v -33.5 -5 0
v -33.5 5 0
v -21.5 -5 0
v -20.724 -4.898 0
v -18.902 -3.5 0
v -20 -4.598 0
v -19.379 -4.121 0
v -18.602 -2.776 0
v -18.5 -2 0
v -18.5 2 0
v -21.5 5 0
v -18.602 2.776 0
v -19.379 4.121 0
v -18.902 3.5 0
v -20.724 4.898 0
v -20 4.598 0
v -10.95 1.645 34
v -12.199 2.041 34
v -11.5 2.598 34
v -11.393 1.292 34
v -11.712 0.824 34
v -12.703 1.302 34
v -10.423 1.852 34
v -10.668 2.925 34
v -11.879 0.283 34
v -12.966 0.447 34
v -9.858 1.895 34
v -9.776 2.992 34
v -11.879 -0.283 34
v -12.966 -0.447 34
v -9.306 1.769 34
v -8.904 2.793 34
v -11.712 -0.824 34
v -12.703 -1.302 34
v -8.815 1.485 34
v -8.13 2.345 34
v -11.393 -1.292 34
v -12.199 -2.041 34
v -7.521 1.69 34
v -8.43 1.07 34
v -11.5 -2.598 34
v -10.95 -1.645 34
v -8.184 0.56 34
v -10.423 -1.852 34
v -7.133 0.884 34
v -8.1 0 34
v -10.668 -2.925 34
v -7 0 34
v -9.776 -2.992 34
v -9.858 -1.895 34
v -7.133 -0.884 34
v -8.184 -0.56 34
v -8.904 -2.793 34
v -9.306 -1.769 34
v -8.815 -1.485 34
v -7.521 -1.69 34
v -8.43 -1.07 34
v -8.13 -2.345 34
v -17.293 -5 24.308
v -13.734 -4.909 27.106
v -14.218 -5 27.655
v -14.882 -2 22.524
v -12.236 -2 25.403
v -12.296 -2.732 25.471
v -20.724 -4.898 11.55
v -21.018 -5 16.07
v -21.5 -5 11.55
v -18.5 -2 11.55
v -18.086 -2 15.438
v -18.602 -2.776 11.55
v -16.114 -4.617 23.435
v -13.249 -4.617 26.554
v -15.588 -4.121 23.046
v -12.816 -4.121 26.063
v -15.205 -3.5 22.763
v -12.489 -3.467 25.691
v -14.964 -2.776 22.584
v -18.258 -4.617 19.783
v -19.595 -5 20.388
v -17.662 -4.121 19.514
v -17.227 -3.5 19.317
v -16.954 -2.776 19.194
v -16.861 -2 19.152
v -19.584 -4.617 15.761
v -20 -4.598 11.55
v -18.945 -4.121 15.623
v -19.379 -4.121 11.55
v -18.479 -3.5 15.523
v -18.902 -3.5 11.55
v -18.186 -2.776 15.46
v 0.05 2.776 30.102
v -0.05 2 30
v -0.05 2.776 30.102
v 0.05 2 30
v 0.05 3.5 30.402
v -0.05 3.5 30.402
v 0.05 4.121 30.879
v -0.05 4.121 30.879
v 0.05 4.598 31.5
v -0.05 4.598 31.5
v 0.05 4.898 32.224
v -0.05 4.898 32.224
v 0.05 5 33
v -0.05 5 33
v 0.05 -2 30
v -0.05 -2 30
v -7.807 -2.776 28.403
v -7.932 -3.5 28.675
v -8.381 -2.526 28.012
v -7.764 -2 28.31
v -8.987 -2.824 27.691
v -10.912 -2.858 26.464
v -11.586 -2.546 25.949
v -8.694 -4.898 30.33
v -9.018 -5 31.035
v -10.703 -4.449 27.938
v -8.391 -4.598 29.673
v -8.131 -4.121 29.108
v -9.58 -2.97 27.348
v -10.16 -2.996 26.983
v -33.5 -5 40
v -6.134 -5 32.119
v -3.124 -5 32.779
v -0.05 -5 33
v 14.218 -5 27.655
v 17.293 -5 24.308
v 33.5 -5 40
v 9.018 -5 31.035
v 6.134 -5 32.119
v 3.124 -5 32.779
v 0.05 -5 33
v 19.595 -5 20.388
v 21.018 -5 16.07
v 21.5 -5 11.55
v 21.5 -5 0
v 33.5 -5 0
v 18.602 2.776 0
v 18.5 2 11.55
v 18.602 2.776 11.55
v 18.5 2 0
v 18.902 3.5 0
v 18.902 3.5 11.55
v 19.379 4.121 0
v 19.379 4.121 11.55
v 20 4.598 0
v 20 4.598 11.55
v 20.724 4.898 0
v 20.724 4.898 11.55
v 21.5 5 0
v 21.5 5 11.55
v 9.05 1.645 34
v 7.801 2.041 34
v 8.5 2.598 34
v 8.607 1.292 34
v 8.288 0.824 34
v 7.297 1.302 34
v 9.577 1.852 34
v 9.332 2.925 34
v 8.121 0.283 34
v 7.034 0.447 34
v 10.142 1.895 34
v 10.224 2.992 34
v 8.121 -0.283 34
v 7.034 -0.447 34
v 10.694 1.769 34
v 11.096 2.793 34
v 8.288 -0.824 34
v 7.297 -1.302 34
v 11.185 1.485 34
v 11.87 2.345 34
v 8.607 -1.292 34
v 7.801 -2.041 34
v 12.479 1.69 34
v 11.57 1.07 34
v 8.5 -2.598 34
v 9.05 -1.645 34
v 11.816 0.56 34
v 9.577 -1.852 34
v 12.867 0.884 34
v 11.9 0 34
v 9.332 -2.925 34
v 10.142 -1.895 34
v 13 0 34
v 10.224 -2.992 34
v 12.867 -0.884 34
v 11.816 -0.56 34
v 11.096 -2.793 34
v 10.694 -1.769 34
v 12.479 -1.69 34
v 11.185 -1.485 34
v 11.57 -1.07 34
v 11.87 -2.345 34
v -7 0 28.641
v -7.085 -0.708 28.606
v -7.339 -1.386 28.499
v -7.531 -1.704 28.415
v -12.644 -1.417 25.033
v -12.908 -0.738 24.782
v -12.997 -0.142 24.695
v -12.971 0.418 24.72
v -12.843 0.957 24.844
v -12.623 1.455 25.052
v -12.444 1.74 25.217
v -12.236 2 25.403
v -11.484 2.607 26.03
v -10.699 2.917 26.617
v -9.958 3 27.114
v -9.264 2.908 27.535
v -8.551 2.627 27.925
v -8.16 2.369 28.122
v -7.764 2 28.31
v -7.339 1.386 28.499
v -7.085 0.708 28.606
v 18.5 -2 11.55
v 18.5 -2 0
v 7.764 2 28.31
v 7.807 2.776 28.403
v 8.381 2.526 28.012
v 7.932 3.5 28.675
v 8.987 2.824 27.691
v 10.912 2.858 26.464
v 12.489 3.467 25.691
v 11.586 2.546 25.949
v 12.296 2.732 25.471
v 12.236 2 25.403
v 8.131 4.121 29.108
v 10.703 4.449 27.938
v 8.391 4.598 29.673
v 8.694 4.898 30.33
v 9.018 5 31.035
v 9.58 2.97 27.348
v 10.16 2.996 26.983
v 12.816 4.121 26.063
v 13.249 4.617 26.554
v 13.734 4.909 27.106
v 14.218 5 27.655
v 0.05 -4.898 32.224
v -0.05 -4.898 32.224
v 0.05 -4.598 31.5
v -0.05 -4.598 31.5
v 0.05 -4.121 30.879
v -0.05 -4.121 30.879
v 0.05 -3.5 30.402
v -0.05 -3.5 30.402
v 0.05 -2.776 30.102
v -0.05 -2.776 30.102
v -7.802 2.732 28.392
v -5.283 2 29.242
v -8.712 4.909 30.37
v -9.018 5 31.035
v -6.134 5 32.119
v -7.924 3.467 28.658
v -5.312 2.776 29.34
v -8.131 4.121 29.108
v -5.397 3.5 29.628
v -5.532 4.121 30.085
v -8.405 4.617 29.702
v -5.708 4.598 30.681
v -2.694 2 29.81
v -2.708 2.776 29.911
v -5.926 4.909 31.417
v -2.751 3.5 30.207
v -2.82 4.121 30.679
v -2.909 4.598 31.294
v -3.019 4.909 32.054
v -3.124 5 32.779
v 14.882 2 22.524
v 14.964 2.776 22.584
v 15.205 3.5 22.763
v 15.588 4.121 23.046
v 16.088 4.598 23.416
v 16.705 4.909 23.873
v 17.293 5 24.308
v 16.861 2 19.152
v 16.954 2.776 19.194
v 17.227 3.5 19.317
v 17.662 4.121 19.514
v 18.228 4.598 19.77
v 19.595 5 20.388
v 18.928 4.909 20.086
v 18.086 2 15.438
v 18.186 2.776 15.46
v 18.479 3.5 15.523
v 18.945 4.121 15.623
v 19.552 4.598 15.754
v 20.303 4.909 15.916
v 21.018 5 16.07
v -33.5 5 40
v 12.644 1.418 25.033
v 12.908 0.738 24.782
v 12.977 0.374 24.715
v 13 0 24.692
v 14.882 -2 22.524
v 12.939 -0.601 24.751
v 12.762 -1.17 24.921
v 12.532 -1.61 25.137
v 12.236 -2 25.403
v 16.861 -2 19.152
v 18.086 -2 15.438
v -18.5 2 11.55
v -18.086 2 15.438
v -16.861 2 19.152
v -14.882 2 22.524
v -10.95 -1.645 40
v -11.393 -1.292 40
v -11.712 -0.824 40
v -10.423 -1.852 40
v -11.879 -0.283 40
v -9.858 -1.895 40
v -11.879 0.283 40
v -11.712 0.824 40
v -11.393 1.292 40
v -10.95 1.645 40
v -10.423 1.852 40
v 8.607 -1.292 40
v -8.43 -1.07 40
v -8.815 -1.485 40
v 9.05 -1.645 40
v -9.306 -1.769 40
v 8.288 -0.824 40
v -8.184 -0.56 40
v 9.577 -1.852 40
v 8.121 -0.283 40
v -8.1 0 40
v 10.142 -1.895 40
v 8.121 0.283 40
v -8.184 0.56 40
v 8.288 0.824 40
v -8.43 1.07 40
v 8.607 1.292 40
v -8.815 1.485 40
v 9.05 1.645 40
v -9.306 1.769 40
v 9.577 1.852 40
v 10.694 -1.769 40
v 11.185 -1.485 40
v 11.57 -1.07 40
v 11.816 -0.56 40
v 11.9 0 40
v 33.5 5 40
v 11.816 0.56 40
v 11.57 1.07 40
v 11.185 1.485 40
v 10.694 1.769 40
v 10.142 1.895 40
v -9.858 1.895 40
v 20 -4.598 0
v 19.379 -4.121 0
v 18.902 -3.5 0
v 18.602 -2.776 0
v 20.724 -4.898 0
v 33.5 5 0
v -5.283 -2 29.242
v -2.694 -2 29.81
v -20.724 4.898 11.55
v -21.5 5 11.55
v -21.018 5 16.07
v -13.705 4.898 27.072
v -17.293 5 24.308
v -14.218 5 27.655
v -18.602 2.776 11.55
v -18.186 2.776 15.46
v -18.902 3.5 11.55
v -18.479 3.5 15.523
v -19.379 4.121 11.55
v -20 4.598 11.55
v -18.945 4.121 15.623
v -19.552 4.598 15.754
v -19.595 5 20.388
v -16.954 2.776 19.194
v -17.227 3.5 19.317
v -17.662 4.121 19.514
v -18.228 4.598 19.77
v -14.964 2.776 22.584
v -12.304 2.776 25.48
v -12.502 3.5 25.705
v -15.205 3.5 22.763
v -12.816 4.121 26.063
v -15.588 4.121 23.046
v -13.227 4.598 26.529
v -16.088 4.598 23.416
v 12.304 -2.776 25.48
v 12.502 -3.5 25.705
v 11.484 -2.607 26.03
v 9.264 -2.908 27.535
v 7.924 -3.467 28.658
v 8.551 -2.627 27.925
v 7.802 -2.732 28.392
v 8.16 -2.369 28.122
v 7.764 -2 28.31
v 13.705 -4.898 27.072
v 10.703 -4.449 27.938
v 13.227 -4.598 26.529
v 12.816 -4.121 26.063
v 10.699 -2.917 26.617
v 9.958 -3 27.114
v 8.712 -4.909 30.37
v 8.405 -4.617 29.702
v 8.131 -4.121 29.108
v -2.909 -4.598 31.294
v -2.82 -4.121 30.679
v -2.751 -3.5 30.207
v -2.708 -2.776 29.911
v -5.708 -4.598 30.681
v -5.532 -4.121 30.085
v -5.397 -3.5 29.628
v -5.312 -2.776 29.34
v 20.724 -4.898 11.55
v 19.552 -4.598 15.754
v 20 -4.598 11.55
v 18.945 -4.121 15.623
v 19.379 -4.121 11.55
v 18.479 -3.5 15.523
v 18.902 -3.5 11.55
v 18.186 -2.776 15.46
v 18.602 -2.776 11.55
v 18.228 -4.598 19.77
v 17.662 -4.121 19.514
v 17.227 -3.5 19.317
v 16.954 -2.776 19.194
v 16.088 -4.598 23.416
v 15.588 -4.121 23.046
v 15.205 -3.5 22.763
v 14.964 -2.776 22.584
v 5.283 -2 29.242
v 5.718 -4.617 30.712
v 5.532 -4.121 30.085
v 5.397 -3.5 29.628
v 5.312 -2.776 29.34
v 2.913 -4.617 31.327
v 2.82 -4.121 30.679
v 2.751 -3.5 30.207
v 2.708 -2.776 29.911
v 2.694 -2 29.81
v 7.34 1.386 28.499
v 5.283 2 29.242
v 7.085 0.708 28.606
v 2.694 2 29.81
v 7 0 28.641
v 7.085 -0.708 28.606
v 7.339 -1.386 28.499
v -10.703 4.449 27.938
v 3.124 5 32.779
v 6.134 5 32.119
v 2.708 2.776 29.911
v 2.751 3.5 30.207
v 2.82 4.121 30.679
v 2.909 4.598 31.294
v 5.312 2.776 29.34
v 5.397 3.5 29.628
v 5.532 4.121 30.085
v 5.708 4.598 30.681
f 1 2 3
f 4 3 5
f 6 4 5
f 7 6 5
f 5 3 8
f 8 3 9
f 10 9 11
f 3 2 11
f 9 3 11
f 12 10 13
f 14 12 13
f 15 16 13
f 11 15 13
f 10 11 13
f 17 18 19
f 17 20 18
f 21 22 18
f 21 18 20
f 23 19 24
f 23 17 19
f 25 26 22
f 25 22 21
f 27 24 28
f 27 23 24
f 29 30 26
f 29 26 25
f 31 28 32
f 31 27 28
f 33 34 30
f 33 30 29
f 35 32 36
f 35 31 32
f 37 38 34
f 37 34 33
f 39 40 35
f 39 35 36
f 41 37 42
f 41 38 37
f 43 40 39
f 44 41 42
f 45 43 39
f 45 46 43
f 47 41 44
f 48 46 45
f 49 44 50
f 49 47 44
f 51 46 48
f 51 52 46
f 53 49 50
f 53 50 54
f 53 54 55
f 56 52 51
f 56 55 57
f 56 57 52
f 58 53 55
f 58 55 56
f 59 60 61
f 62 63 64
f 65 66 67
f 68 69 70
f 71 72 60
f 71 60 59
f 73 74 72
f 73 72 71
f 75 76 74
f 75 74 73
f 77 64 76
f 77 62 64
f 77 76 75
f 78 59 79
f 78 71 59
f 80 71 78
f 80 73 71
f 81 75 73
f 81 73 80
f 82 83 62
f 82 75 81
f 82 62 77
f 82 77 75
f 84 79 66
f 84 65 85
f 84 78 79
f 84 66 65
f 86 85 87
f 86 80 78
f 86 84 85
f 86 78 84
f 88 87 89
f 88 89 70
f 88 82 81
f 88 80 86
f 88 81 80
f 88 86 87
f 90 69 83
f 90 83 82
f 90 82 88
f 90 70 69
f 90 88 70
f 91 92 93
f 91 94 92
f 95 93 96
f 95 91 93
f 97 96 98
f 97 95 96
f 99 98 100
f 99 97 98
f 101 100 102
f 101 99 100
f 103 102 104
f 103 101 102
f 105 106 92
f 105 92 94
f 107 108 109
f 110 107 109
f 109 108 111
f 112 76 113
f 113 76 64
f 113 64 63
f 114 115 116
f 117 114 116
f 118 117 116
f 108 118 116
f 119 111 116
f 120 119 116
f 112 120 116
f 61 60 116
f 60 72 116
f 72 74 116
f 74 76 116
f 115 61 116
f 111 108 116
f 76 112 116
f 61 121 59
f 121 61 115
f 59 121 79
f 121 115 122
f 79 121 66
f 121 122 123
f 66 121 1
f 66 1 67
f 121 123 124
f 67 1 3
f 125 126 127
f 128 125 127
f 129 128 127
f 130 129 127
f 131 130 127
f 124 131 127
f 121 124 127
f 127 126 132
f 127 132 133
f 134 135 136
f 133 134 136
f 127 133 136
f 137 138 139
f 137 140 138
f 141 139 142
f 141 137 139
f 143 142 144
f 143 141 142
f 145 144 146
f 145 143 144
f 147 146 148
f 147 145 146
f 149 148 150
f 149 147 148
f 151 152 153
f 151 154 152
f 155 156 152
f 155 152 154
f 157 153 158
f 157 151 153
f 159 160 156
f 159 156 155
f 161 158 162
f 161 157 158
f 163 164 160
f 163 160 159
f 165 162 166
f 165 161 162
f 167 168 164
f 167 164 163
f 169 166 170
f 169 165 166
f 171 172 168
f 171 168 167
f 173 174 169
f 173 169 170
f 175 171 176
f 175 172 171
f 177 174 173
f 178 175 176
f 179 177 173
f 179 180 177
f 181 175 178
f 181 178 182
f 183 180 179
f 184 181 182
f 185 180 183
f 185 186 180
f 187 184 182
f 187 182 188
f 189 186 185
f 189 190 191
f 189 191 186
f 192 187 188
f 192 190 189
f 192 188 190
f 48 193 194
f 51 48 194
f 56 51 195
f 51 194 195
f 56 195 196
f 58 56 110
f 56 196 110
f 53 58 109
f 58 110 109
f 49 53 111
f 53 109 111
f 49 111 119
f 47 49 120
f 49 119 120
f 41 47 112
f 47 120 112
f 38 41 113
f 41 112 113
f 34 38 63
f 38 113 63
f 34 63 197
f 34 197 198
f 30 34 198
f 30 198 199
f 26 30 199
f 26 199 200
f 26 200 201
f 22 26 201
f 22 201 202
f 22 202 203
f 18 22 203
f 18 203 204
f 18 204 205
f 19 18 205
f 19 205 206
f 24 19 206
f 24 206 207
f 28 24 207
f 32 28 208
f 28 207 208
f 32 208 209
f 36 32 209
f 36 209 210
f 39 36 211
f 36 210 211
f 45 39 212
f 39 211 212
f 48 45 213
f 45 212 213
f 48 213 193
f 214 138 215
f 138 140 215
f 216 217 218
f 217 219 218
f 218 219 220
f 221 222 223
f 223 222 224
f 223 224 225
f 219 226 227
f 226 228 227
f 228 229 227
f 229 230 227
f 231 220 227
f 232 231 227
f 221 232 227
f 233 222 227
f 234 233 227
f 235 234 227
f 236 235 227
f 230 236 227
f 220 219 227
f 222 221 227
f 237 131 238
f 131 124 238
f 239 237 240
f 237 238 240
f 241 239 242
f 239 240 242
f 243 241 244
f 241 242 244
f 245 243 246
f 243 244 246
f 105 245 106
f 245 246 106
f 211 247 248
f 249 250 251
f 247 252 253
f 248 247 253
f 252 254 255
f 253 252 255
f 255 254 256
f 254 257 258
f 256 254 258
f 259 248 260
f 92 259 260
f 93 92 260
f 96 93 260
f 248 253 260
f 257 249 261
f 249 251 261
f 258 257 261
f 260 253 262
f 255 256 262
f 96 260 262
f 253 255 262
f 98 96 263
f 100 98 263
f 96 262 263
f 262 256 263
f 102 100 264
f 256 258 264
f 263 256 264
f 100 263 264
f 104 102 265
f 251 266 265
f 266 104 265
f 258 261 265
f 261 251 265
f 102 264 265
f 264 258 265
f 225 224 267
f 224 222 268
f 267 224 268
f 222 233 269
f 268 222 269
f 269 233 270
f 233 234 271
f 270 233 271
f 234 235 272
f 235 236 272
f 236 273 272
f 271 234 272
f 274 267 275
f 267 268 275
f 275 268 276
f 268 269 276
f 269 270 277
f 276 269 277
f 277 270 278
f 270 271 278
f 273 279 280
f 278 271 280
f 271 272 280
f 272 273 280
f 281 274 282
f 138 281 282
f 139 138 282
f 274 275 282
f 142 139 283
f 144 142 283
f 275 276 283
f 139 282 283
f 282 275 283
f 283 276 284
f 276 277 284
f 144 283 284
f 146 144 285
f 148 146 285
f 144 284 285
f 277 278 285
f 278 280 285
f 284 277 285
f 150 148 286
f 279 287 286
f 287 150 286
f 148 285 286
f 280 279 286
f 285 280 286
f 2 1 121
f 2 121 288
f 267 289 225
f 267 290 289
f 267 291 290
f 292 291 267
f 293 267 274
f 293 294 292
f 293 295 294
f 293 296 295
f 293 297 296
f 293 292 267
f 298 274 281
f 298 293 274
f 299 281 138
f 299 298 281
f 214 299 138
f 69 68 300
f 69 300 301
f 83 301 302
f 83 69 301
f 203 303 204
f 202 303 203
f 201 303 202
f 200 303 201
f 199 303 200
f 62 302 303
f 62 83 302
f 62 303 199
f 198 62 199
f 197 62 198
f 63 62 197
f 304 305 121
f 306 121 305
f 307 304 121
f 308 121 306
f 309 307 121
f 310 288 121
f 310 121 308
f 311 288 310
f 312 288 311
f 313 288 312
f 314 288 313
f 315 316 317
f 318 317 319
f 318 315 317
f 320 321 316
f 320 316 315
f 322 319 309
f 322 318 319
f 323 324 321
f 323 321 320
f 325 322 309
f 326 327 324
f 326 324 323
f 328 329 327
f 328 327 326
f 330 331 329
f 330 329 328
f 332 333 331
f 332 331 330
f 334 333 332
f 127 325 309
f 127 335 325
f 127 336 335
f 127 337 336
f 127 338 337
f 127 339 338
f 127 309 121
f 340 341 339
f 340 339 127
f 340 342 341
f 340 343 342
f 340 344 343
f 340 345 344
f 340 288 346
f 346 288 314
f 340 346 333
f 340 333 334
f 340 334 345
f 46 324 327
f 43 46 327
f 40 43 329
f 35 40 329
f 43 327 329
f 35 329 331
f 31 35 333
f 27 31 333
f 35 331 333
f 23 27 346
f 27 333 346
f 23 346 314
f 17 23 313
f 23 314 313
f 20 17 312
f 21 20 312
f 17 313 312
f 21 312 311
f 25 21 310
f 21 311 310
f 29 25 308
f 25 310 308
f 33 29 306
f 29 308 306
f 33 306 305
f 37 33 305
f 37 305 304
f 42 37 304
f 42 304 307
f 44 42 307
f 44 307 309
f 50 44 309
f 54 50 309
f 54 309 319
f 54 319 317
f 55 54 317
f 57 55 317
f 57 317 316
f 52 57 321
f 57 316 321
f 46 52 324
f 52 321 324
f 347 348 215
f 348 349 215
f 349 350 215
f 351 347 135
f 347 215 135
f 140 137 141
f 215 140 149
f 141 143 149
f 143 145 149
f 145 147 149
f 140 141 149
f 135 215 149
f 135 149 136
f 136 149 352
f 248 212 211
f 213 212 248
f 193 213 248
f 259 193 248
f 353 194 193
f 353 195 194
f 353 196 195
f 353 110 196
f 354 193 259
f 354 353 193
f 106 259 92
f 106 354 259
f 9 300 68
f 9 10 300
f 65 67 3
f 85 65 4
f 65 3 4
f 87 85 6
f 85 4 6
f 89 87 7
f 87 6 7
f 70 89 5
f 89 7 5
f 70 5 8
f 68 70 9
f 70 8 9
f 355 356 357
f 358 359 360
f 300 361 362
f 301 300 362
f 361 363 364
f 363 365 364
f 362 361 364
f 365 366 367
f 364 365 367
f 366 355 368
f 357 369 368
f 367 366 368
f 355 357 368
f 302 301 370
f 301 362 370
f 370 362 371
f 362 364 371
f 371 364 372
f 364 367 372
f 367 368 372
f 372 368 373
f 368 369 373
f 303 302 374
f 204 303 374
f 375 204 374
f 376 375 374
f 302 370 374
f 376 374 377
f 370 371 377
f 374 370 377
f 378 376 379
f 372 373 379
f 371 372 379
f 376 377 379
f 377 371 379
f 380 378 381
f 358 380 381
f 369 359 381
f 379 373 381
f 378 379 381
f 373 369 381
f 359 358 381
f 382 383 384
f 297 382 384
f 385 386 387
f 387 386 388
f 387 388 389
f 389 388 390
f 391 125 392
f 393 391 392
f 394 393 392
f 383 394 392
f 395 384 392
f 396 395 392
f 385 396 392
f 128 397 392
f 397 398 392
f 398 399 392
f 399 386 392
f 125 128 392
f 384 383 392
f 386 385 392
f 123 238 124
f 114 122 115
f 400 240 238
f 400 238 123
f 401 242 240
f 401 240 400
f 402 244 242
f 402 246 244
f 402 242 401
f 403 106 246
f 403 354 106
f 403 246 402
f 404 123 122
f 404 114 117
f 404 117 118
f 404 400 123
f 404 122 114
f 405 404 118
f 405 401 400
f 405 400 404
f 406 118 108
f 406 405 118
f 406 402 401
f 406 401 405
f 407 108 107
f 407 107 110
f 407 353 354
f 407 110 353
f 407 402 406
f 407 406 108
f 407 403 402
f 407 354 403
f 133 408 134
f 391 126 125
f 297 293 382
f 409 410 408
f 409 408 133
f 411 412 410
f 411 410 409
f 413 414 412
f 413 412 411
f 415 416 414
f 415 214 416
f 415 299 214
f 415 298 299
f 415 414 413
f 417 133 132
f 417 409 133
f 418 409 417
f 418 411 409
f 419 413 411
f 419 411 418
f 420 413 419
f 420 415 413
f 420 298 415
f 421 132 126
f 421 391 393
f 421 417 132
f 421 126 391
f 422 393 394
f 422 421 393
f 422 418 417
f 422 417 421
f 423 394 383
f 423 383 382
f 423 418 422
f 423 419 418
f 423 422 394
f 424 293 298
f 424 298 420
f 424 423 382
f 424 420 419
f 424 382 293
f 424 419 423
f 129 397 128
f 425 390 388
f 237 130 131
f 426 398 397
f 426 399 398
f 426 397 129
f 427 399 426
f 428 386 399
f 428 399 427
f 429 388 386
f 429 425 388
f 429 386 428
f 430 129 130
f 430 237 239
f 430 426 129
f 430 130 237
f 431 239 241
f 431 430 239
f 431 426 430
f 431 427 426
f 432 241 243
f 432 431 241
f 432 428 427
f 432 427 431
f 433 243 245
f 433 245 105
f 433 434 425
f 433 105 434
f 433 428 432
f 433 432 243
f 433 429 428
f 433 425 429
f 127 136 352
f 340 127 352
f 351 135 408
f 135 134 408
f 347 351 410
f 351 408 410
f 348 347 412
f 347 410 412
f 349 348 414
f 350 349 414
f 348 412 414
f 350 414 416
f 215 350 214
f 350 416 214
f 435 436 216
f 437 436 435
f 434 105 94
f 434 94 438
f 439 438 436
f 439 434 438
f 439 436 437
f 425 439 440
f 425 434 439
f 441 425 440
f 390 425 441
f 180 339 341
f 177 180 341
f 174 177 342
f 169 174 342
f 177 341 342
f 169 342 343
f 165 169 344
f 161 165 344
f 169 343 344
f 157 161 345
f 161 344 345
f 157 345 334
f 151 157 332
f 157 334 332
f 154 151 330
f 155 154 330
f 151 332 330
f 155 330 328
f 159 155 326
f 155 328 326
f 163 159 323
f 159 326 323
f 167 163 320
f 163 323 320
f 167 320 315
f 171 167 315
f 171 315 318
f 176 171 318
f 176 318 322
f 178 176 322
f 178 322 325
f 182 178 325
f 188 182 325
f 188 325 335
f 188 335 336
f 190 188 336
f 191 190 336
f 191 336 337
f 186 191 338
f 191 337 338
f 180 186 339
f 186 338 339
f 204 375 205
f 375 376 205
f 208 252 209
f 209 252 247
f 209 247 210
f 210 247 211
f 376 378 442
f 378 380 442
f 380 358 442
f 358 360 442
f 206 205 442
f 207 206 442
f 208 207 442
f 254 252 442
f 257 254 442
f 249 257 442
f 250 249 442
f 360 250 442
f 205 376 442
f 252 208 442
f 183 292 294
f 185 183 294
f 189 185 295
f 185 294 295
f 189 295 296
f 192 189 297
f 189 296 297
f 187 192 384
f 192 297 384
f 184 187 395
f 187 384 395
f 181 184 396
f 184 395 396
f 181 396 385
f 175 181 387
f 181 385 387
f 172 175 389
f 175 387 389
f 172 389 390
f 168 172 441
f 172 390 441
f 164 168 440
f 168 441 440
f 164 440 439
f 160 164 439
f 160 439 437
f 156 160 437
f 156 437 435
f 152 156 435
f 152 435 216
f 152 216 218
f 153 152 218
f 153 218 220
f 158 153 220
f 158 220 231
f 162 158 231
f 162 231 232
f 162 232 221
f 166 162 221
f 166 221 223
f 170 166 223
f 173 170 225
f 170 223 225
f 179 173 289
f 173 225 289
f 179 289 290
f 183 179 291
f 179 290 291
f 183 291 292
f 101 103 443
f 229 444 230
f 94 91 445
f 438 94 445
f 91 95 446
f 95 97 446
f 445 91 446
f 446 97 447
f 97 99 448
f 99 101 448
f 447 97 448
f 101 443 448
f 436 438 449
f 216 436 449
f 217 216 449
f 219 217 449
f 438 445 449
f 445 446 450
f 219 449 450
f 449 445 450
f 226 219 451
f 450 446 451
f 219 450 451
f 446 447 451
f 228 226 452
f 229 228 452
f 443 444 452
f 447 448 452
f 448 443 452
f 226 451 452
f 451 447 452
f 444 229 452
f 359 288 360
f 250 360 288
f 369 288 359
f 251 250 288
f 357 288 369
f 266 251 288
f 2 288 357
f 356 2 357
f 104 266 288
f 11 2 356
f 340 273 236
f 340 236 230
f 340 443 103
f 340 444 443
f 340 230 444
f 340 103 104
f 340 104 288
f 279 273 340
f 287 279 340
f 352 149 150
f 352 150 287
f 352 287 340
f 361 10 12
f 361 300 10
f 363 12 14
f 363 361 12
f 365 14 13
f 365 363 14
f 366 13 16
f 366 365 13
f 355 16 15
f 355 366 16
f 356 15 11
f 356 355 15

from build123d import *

# Parameters (mm, degrees)
SKETCH_W        = 67
SKETCH_H        = 10
PAD_DEPTH       = 40
SKETCH001_W     = 37
SKETCH001_H     = 10
POCKET_DEPTH    = 30
FILLET_R        = 18.45
SKETCH002_R     = 3
POCKET001_DEPTH = 34
SKETCH003_R     = 1.9
POCKET002_DEPTH = 6
FILLET001_R     = 3
FILLET002_R     = 3


with BuildPart() as part:
    # Sketch → Pad (new body)
    with BuildSketch(Plane.XY):
        Rectangle(SKETCH_W, SKETCH_H)
    extrude(amount=PAD_DEPTH)

    # Sketch001 (on Face5 of Pad) → Pocket (cut)
    with BuildSketch(Plane(origin=(0, 0, 0), x_dir=(1, 0, 0), z_dir=(0, 0, -1))):
        Rectangle(SKETCH001_W, SKETCH001_H)
    extrude(amount=-POCKET_DEPTH, mode=Mode.SUBTRACT)

    # Fillet
    fillet_edges = [part.edges().sort_by_distance(p)[0] for p in [
        (-18.5, 0, 30),
        (18.5, 0, 30),
    ]]
    fillet(fillet_edges, radius=FILLET_R)

    # Sketch002 (on Face4 of Fillet) → Pocket001 (cut)
    with BuildSketch(Plane(origin=(0, 0, 0), x_dir=(1, 0, 0), z_dir=(0, 0, -1))):
        with Locations((-10, 0)):
            Circle(SKETCH002_R)
        with Locations((10, 0)):
            Circle(SKETCH002_R)
    extrude(amount=-POCKET001_DEPTH, mode=Mode.SUBTRACT)

    # Sketch003 (on Face8 of Pocket001) → Pocket002 (cut)
    with BuildSketch(Plane.XY.offset(40)):
        with Locations((-10, 0)):
            Circle(SKETCH003_R)
        with Locations((10, 0)):
            Circle(SKETCH003_R)
    extrude(amount=-POCKET002_DEPTH, mode=Mode.SUBTRACT)

    # Fillet001
    fillet001_edges = [part.edges().sort_by_distance(p)[0] for p in [
        (18.5, -5, 5.775),
    ]]
    fillet(fillet001_edges, radius=FILLET001_R)

    # Fillet002
    fillet002_edges = [part.edges().sort_by_distance(p)[0] for p in [
        (-18.5, 5, 5.775),
    ]]
    fillet(fillet002_edges, radius=FILLET002_R)


solid = part.part
